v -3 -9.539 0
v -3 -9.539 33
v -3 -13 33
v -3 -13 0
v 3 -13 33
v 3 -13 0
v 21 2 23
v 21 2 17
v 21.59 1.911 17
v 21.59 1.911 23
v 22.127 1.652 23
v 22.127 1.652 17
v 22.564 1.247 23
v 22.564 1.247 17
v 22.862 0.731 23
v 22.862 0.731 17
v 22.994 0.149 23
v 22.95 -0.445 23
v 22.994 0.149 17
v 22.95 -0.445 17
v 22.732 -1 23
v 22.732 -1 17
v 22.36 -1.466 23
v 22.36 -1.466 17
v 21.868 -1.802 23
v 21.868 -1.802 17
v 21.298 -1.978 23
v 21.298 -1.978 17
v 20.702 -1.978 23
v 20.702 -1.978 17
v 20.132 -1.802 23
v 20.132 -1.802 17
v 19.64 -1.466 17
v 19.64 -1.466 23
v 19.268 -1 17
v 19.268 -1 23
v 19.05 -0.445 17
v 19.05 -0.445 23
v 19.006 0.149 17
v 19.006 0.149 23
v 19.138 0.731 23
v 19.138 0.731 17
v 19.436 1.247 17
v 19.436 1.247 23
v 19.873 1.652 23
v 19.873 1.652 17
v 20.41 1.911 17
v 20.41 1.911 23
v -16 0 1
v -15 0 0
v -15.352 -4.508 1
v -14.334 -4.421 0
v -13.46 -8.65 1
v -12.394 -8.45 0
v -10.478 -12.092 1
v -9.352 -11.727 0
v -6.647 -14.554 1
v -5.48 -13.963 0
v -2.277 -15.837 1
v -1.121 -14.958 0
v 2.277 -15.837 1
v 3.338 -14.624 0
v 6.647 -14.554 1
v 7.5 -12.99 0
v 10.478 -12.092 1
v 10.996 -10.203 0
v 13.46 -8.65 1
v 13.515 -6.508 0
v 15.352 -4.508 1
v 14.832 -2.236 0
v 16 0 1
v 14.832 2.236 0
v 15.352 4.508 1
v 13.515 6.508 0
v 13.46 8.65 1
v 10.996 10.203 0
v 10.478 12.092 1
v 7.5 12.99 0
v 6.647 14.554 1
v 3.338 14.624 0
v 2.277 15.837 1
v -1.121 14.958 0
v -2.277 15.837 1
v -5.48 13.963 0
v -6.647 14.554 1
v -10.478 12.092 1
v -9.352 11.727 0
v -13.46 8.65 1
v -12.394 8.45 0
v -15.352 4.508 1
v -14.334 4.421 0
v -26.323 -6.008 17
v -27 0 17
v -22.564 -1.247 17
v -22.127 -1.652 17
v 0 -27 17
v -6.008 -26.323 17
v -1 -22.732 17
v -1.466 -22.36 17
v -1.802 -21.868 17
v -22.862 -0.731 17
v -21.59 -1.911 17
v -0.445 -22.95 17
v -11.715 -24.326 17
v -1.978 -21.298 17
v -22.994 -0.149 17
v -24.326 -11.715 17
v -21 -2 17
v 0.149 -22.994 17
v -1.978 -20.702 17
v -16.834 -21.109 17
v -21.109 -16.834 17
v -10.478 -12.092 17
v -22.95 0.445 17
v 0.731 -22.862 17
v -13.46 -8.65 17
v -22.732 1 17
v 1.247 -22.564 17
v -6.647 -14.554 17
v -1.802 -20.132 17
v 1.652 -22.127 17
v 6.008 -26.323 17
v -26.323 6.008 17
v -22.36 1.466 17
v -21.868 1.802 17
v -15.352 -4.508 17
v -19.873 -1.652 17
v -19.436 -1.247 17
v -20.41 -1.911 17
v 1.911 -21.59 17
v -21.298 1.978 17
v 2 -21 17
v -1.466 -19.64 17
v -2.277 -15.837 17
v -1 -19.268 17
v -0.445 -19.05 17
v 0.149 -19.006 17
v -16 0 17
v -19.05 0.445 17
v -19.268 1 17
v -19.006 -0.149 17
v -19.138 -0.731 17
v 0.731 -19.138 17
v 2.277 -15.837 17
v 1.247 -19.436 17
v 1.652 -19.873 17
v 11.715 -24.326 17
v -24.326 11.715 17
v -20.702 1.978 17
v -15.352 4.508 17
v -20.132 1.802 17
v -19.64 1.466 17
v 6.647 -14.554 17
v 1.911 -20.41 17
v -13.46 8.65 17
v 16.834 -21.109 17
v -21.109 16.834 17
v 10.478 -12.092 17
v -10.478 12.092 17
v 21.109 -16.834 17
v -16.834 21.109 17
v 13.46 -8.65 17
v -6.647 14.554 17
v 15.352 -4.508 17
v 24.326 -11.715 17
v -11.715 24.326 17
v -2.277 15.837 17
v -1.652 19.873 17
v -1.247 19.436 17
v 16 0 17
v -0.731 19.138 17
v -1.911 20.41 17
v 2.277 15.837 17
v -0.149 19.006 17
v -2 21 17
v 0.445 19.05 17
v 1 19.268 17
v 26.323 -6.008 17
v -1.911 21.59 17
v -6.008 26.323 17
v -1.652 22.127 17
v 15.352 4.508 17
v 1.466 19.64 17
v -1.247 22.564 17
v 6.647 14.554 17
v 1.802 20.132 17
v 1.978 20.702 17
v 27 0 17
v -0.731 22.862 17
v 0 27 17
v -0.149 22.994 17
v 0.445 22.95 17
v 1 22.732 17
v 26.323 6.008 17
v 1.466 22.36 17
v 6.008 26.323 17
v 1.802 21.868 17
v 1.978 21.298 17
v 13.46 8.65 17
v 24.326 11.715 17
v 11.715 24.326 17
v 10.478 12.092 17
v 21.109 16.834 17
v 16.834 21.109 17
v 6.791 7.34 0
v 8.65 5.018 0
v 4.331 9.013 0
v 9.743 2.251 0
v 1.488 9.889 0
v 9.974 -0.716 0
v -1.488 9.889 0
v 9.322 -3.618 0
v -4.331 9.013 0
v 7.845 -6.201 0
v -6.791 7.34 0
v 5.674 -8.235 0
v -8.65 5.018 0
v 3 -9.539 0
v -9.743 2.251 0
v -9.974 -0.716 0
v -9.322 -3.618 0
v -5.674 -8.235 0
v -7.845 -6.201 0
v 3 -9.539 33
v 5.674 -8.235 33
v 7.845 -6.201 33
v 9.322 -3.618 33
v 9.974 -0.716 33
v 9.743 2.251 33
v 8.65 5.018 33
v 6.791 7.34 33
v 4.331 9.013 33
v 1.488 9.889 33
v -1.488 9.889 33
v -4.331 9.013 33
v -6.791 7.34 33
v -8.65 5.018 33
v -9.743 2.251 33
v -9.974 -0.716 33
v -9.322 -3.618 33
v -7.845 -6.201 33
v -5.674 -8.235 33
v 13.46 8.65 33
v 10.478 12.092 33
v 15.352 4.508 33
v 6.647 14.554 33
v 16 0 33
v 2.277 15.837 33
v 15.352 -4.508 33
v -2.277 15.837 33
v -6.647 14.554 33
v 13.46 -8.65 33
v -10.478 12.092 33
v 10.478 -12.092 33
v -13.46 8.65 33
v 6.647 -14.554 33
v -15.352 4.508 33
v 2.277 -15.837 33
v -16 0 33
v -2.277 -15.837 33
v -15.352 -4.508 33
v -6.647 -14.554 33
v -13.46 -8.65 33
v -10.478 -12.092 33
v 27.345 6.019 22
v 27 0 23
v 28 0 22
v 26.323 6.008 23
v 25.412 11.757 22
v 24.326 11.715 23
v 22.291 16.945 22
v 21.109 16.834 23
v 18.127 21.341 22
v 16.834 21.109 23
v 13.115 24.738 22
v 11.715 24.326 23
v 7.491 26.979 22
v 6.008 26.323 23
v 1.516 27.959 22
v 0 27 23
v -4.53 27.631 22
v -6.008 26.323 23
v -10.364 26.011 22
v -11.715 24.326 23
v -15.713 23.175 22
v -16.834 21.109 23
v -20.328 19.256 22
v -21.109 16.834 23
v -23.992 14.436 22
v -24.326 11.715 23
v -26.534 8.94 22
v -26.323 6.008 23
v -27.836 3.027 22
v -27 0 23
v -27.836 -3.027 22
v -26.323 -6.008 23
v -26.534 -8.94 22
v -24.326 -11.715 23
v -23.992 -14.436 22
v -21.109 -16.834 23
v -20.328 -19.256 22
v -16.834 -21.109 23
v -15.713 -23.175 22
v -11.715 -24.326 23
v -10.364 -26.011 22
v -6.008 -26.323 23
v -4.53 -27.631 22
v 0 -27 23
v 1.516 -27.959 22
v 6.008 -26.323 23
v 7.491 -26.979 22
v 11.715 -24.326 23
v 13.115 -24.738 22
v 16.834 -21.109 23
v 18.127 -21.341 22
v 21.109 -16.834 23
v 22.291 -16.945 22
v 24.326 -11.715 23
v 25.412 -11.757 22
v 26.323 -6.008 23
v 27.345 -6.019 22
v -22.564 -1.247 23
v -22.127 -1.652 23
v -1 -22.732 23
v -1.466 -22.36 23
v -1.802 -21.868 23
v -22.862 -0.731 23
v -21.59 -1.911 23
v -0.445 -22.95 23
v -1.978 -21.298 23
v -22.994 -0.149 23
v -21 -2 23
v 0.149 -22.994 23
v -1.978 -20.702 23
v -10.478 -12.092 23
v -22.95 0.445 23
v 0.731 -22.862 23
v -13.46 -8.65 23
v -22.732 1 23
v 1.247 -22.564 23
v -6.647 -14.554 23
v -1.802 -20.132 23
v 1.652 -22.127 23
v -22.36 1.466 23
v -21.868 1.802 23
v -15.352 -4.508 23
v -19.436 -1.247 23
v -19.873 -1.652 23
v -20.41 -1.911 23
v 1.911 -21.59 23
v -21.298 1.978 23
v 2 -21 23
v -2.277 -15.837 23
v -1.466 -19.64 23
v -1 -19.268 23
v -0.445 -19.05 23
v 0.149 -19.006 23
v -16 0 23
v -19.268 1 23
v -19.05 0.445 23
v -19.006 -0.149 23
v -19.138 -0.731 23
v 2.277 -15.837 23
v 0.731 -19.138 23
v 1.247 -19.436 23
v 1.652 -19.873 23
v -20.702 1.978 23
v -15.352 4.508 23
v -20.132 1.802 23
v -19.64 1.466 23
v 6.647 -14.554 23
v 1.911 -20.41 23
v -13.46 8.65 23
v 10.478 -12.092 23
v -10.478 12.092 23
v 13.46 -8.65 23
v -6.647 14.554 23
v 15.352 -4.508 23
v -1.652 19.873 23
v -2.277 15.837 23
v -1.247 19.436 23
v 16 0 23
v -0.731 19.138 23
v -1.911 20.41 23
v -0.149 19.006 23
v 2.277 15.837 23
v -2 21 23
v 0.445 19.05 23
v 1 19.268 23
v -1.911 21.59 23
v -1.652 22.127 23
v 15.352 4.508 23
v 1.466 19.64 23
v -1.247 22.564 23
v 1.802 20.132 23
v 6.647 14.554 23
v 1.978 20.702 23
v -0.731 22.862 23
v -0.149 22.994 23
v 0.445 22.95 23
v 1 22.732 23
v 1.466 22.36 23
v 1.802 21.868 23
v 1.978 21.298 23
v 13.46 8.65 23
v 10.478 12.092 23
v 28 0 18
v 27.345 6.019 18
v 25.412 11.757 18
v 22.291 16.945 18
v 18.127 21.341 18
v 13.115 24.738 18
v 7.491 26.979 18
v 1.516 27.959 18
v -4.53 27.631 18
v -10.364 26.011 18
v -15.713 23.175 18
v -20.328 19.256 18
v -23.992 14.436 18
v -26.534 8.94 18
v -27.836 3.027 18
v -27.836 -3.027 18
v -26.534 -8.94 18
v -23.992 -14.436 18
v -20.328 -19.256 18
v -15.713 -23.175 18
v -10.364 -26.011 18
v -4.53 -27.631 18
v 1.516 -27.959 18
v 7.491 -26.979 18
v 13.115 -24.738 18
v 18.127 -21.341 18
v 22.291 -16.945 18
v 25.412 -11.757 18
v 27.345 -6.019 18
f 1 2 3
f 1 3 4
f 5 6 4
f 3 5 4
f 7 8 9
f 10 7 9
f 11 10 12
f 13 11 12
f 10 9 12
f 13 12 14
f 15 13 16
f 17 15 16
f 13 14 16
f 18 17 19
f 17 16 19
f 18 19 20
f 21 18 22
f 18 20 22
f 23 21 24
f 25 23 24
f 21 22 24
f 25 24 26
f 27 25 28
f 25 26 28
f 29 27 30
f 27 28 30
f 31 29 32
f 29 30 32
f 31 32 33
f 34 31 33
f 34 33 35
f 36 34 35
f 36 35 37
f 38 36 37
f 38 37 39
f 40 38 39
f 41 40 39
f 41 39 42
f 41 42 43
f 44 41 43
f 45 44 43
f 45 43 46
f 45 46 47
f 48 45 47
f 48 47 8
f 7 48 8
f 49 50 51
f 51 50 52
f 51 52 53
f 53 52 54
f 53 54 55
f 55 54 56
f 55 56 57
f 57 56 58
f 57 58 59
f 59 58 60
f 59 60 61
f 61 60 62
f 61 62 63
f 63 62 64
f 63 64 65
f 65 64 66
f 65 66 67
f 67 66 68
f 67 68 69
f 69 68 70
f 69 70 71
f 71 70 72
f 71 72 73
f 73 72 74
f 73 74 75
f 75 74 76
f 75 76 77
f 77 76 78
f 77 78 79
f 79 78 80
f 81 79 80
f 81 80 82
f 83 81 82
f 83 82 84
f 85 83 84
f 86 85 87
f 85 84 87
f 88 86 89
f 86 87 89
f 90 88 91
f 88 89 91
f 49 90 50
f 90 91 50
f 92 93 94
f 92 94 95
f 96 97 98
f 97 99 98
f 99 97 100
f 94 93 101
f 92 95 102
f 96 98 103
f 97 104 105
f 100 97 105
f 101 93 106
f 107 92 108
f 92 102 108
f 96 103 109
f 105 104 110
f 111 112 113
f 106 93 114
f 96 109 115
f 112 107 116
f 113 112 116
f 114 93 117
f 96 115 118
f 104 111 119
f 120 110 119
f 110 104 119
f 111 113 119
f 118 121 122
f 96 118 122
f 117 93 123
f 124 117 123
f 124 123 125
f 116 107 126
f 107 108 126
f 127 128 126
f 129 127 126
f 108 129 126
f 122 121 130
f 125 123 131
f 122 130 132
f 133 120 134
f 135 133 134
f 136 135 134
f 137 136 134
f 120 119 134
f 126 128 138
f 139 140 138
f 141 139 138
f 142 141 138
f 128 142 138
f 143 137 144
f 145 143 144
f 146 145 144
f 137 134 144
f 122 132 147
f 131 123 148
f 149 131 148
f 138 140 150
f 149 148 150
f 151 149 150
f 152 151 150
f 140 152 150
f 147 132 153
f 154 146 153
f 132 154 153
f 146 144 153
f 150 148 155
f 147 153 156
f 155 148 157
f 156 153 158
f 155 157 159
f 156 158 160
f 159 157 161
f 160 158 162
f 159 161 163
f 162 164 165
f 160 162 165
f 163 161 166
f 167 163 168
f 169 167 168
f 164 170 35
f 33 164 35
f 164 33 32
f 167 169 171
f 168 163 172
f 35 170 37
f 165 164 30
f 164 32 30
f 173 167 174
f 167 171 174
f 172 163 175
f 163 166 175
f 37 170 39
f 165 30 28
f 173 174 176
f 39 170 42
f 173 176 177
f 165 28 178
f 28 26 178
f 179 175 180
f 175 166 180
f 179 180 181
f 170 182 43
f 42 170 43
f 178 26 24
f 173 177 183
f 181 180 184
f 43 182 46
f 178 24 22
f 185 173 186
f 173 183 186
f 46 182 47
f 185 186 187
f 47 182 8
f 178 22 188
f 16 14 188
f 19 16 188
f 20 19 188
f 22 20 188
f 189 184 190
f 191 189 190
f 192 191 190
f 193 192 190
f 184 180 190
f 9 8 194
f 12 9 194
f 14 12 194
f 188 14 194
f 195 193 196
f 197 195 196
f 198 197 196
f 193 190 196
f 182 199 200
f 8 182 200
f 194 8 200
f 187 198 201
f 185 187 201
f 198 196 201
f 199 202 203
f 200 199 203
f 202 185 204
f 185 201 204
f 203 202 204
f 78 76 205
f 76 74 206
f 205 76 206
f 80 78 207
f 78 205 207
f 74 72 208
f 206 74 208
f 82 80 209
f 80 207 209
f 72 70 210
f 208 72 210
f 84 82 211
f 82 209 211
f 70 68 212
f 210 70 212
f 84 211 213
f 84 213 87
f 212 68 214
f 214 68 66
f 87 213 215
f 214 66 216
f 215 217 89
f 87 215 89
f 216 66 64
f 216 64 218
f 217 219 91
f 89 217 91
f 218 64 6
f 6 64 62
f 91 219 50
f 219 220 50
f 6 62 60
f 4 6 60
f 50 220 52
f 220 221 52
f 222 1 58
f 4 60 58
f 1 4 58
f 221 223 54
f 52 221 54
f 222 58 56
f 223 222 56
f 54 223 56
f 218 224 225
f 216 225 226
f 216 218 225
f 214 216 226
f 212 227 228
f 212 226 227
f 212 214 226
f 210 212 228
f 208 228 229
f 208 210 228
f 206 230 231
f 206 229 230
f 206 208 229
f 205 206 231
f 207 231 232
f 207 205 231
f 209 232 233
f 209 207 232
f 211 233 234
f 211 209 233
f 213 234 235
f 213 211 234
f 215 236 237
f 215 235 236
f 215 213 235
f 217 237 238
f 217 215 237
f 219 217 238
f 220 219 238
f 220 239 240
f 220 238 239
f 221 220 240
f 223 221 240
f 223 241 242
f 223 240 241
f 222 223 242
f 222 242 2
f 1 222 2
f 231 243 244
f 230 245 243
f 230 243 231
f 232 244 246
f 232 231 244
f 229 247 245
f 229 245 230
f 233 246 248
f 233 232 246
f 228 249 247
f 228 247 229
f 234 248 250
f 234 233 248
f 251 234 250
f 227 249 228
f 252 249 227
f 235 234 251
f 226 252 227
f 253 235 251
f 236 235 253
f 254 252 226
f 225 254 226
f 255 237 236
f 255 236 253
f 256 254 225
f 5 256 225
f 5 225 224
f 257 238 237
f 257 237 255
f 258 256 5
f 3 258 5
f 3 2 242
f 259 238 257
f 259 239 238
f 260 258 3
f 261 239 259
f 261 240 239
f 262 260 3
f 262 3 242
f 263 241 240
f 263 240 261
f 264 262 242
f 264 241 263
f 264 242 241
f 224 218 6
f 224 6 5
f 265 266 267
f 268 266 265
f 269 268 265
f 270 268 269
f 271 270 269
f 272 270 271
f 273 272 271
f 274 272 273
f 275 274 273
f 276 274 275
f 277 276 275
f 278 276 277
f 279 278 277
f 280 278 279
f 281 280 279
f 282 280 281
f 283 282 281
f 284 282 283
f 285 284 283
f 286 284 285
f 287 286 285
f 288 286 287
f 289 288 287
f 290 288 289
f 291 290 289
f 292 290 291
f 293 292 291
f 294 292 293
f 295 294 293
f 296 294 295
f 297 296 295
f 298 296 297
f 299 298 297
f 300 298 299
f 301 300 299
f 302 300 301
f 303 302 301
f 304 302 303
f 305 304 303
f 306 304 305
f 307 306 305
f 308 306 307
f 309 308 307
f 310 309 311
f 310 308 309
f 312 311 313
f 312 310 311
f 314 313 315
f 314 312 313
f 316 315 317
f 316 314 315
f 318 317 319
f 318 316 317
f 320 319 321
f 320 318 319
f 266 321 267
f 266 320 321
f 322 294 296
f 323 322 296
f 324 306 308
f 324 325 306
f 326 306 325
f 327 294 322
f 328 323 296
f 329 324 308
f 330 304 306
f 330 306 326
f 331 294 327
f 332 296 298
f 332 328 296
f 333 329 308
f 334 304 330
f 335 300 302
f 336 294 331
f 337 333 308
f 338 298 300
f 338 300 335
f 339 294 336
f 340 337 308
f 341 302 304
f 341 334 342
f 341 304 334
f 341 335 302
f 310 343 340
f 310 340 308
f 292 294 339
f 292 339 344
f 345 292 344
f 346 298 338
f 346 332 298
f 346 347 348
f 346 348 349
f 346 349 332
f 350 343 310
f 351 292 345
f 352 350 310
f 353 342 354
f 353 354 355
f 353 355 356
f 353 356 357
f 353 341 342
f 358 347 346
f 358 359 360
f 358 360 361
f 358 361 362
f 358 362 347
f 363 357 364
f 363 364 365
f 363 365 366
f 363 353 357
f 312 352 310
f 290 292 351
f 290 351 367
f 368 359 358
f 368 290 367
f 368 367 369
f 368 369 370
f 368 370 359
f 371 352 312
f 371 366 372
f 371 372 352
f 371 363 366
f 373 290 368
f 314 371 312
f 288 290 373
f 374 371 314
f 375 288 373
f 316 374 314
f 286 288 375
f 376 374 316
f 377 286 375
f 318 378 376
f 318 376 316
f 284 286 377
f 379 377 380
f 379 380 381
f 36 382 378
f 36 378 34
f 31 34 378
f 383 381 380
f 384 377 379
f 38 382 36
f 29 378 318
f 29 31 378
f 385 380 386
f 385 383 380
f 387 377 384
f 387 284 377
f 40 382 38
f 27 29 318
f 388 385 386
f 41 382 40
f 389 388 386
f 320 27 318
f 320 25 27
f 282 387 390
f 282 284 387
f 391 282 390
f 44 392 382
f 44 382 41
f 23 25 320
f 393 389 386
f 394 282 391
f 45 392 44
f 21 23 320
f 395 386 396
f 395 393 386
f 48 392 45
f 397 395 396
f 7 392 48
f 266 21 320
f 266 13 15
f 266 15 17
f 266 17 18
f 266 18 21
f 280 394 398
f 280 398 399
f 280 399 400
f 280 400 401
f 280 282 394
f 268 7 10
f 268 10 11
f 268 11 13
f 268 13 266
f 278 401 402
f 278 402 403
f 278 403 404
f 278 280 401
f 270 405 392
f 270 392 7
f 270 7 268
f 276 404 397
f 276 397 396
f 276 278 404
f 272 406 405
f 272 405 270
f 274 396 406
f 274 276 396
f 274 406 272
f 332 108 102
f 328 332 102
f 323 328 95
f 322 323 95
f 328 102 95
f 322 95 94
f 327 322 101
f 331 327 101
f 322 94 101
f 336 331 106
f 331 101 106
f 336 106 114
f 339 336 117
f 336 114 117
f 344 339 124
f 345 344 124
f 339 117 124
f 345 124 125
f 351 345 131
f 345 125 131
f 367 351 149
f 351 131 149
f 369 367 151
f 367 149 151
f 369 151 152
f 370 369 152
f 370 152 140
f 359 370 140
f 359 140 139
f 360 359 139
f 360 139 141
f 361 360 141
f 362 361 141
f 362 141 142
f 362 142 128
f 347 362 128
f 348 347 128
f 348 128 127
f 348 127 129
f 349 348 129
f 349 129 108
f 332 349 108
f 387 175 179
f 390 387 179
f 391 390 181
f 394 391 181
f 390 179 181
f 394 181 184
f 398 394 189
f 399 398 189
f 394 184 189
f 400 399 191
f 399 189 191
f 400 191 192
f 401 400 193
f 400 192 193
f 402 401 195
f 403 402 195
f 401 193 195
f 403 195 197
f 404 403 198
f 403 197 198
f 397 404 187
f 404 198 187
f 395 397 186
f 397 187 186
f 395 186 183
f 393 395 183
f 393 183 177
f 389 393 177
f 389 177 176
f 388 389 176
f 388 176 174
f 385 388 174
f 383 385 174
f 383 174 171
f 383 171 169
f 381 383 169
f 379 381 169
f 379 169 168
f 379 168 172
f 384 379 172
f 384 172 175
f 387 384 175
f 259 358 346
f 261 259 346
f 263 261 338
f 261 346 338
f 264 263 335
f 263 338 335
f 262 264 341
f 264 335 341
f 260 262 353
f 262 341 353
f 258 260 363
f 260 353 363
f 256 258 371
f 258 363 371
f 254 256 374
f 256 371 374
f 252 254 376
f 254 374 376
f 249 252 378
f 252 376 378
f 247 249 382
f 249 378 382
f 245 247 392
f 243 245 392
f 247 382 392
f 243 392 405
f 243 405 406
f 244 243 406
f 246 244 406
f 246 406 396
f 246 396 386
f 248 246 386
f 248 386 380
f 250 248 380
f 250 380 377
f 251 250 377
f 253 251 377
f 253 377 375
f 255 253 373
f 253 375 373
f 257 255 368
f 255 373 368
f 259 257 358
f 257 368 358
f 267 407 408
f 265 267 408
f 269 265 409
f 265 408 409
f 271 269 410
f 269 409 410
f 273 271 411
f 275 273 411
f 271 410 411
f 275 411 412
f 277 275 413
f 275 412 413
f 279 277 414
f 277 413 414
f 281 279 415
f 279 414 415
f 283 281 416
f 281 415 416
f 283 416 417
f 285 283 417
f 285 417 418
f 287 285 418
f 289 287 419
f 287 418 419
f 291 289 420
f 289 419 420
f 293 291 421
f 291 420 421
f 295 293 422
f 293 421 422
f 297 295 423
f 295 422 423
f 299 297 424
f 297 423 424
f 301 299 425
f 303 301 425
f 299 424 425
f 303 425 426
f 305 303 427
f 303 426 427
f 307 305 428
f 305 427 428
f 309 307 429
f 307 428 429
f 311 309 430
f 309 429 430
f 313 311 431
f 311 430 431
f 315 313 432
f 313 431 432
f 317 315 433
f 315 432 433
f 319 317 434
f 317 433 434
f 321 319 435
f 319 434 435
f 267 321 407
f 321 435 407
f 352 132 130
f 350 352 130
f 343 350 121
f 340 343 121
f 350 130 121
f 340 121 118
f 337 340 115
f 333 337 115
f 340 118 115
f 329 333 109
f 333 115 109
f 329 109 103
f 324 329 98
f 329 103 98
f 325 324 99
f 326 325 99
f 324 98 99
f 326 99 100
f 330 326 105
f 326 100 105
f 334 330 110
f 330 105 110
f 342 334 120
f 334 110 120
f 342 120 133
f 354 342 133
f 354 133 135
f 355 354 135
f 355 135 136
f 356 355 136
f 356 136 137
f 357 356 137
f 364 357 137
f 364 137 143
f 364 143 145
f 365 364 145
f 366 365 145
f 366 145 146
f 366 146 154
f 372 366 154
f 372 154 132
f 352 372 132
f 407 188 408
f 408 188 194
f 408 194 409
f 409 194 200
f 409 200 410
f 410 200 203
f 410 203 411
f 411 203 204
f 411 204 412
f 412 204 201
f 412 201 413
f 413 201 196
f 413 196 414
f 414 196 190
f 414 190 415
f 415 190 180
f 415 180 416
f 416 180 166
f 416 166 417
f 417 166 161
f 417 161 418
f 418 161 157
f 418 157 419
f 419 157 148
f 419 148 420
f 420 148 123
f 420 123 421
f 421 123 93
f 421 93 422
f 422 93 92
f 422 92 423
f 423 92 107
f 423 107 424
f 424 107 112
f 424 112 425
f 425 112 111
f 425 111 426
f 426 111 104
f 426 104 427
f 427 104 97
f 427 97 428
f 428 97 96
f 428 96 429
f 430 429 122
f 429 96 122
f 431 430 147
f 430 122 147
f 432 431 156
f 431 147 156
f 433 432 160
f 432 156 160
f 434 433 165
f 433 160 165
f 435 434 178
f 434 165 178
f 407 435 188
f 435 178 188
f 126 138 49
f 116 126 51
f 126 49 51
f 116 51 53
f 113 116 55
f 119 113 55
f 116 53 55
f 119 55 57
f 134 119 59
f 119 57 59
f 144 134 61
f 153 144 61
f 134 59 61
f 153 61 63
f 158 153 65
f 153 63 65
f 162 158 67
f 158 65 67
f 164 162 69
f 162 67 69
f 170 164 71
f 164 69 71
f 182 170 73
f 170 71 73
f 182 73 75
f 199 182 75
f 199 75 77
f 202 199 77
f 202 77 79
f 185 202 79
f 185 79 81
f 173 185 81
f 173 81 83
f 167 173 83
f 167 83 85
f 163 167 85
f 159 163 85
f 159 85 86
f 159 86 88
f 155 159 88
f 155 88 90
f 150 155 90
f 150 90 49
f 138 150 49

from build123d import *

# Parameters (mm, degrees)
SKETCH_1_R               = 16
EXTRUDE_1_DEPTH          = 13
SKETCH_2_R               = 16
EXTRUDE_2_DEPTH          = 4
SKETCH_3_R               = 28
EXTRUDE_3_DEPTH          = 6
SKETCH_4_R               = 7
EXTRUDE_4_DEPTH          = 5
SKETCH_6_R               = 2
CUT_EXTRUDE_1_DEPTH      = 10
SKETCH_7_R               = 10
CUT_EXTRUDE_2_DEPTH      = 60
PATTERN_CIRCULAR_2_COUNT = 4
CHAMFER_3_SIZE           = 1
CHAMFER_4_SIZE           = 1
CHAMFER_6_SIZE           = 1
SKETCH_8_R               = 16
SKETCH_8_R_2             = 10
EXTRUDE_5_DEPTH          = 10
CUT_EXTRUDE_3_DEPTH      = 13


with BuildPart() as part:
    # 草图1 → 凸台-拉伸1 (new body)
    with BuildSketch(Plane.XY):
        with Locations(Location((0, 0, 0), (0, 0, 180))):
            Circle(SKETCH_1_R)
    extrude(amount=EXTRUDE_1_DEPTH)

    # 草图2 → 凸台-拉伸2 (add)
    with BuildSketch(Plane.XY.offset(13)):
        with Locations(Location((0, 0, 0), (0, 0, 180))):
            Circle(SKETCH_2_R)
    extrude(amount=EXTRUDE_2_DEPTH)

    # 草图3 → 凸台-拉伸3 (add)
    with BuildSketch(Plane.XY.offset(17)):
        Circle(SKETCH_3_R)
    extrude(amount=EXTRUDE_3_DEPTH)

    # 草图4 → 凸台-拉伸4 (add)
    with BuildSketch(Plane.XY.offset(23)):
        Circle(SKETCH_4_R)
    extrude(amount=EXTRUDE_4_DEPTH)

    # 草图6 → 切除-拉伸1 (cut)
    with BuildSketch(Plane(origin=(0, 0, 17), x_dir=(-1, 0, 0), z_dir=(0, 0, -1))):
        with Locations((0, 21)):
            Circle(SKETCH_6_R)
    cut_extrude_1 = extrude(amount=-CUT_EXTRUDE_1_DEPTH, mode=Mode.SUBTRACT)

    # 草图7 → 切除-拉伸2 (cut)
    with BuildSketch(Plane(origin=(0, 0, 0), x_dir=(-1, 0, 0), z_dir=(0, 0, -1))):
        Circle(SKETCH_7_R)
    extrude(amount=-CUT_EXTRUDE_2_DEPTH, mode=Mode.SUBTRACT)

    # 阵列(圆周)2: 切除-拉伸1 ×4 about axis
    pattern_circular_2_axis = Axis((0, 0, 0), (0, 0, 1))
    for i in range(1, PATTERN_CIRCULAR_2_COUNT):
        add(cut_extrude_1.rotate(pattern_circular_2_axis, i * 360 / PATTERN_CIRCULAR_2_COUNT), mode=Mode.SUBTRACT)

    # 倒角3
    chamfer_3_edges = [part.edges().sort_by_distance(p)[0] for p in [
        (-28, 0, 23),
    ]]
    chamfer(chamfer_3_edges, length=CHAMFER_3_SIZE)

    # 倒角4
    chamfer_4_edges = [part.edges().sort_by_distance(p)[0] for p in [
        (-28, 0, 17),
    ]]
    chamfer(chamfer_4_edges, length=CHAMFER_4_SIZE)

    # 倒角6
    chamfer_6_edges = [part.edges().sort_by_distance(p)[0] for p in [
        (16, 0, 0),
    ]]
    chamfer(chamfer_6_edges, length=CHAMFER_6_SIZE)

    # 草图8 → 凸台-拉伸5 (add)
    with BuildSketch(Plane.XY.offset(23)):
        with Locations(Location((0, 0, 0), (0, 0, 180))):
            Circle(SKETCH_8_R)
        with Locations(Location((0, 0, 0), (0, 0, 180))):
            Circle(SKETCH_8_R_2, mode=Mode.SUBTRACT)
    extrude(amount=EXTRUDE_5_DEPTH)

    # 草图9 → 切除-拉伸3 (cut)
    with BuildSketch(Plane(origin=(0, 0, 0), x_dir=(1, 0, 0), z_dir=(0, 1, 0))):
        Polygon((-3, 0), (0, 0), (3, 0), (3, -33), (-3, -33), align=None)
    extrude(amount=-CUT_EXTRUDE_3_DEPTH, mode=Mode.SUBTRACT)


solid = part.part
